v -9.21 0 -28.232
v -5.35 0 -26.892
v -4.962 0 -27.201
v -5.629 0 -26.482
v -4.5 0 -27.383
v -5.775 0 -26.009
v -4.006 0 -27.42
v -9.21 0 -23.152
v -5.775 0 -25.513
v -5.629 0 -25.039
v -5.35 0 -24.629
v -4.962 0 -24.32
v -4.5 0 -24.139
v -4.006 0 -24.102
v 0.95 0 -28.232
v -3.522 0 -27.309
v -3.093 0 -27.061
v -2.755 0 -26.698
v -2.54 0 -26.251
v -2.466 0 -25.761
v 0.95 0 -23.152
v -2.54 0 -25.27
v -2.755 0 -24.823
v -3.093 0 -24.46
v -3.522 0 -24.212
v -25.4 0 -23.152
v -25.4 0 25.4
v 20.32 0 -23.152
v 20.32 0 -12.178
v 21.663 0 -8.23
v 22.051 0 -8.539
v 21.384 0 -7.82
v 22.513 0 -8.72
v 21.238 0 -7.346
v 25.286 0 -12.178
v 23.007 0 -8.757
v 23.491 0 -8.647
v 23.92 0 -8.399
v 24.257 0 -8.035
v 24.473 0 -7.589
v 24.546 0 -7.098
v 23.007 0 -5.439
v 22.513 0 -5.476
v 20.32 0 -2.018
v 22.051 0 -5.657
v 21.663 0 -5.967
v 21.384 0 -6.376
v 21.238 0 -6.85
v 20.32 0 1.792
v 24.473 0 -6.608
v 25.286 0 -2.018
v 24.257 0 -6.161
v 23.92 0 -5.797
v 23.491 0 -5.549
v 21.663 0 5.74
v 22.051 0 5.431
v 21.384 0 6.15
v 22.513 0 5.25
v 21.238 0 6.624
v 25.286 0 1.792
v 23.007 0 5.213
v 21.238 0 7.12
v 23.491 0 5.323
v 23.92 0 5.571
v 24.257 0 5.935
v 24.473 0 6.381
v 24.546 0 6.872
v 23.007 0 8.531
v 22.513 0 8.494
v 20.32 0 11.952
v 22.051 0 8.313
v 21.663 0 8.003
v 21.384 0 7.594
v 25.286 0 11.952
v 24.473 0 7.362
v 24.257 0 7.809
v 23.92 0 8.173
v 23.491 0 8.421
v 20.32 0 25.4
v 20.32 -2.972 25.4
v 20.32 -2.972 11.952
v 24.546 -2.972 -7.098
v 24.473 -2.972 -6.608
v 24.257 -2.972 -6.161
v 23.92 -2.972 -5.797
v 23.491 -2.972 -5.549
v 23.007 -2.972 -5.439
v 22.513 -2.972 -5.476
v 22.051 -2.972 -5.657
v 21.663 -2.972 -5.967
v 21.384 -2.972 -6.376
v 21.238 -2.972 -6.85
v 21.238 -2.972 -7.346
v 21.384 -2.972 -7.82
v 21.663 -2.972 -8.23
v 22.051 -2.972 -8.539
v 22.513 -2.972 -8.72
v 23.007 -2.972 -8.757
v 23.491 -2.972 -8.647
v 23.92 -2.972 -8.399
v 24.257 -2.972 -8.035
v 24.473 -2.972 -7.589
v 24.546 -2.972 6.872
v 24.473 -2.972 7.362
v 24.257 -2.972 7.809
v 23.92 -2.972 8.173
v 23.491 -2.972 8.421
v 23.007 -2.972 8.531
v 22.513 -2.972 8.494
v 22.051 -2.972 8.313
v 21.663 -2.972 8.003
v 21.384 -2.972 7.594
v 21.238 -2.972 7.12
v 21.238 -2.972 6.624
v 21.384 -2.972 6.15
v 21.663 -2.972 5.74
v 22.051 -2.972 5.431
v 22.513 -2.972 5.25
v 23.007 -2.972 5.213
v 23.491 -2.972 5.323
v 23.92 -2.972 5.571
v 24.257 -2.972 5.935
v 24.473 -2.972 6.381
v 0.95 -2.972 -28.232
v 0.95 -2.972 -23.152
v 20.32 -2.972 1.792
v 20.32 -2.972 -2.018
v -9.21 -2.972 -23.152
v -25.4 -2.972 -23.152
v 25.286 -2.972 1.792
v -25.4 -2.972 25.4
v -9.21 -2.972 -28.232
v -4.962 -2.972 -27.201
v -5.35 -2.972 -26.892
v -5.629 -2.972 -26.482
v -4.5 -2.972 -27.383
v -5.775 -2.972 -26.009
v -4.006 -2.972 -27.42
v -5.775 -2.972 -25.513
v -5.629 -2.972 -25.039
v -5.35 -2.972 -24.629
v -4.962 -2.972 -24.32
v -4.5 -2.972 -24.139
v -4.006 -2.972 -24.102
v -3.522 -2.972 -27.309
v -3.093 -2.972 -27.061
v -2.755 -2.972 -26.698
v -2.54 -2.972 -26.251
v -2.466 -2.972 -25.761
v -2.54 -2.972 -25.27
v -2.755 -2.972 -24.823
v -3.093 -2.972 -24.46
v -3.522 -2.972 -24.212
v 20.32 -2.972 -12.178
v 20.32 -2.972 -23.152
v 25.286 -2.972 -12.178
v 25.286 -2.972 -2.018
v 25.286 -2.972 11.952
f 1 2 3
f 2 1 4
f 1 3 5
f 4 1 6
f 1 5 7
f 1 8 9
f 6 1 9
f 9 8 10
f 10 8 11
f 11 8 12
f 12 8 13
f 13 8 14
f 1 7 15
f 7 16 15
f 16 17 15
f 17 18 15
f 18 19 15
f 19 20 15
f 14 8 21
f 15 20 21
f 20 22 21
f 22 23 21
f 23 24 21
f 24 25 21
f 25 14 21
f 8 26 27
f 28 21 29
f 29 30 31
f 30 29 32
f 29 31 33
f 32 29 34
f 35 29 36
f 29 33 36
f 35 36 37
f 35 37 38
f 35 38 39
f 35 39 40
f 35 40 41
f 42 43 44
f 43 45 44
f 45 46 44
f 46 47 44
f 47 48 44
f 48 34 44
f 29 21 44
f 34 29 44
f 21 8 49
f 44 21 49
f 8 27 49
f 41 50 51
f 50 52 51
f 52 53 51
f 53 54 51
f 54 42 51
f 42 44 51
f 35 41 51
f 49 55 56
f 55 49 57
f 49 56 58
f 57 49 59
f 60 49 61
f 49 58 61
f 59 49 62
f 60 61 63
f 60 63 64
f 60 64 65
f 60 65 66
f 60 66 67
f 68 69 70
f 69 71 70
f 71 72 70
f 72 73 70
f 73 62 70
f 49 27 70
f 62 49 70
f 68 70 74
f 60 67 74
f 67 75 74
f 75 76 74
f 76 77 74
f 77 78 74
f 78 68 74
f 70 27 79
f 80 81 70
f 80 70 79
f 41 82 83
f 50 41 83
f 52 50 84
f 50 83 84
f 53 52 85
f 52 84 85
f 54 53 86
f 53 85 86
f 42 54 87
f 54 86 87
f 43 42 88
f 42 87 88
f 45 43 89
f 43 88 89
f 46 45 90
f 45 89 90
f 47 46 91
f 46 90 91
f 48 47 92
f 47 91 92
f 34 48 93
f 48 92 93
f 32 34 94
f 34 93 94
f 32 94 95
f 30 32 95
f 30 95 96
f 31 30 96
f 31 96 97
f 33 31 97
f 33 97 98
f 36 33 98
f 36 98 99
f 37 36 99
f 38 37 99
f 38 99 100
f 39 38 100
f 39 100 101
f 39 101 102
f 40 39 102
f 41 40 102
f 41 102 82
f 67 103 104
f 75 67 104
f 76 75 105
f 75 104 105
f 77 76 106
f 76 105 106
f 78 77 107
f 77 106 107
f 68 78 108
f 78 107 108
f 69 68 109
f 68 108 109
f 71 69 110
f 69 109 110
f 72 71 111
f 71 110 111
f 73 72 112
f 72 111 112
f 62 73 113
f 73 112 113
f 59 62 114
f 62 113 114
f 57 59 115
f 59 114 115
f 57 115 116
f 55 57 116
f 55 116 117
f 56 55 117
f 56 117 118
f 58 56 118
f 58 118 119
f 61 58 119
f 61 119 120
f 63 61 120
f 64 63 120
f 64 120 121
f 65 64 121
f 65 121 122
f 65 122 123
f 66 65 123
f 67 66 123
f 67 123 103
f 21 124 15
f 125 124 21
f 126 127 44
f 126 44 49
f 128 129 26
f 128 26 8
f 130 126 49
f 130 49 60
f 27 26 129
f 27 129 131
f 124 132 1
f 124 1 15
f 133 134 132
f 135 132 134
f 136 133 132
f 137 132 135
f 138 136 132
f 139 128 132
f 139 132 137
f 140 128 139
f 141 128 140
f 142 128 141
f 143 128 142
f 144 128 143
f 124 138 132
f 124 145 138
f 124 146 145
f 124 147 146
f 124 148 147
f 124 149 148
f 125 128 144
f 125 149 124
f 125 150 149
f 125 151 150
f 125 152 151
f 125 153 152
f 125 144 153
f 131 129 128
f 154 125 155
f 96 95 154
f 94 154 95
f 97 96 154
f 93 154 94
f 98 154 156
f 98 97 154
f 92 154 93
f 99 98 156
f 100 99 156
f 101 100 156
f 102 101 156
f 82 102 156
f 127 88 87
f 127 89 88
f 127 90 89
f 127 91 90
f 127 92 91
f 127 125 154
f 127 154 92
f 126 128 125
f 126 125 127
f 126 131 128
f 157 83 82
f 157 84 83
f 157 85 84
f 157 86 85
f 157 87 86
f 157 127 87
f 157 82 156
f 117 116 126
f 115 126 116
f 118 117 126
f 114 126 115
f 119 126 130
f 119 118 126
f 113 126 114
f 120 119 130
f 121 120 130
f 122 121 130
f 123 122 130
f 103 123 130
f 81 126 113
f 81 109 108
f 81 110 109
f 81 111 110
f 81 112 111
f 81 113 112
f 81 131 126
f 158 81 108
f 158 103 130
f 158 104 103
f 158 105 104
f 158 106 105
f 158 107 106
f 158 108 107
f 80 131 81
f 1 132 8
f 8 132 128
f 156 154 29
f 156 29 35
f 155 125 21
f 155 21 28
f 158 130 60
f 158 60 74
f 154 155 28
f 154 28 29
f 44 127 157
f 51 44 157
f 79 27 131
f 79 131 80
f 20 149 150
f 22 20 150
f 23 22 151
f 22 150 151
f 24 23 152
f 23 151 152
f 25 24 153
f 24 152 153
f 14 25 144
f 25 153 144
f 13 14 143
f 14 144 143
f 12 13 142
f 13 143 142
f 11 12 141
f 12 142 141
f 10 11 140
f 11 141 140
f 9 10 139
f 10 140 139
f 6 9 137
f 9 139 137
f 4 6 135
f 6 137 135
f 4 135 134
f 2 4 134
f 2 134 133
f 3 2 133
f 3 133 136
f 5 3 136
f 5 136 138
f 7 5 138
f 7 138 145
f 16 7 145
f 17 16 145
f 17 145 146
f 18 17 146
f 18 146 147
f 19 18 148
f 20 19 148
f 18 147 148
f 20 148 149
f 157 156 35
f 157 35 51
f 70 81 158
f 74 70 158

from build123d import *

# Parameters (mm, degrees)
F0_W      = 50.8
F0_H      = 50.8
F1_DEPTH  = 2.9718
F3_W      = 5.08
F3_H      = 50.8
F4_DEPTH  = 2.9728
F2_W      = 5.08
F2_H      = 10.16
F5_DEPTH  = 2.9718
F6_W      = 45.72
F6_H      = 2.2479
F7_DEPTH  = 2.9728
F8_R      = 1.6637
F9_DEPTH  = 2.9728
F10_W     = 10.16
F10_H     = 5.08
F10_R     = 1.6637
F11_DEPTH = 2.9718


with BuildPart() as f1:
    # F0 (on Front) → F1 (new body)
    with BuildSketch(Plane.XZ):
        Rectangle(F0_W, F0_H)
    extrude(amount=F1_DEPTH)

    # F3 (on face) → F4 (cut, through all)
    with BuildSketch(Plane.XZ.offset(2.9718)):
        with Locations((22.86, 0)):
            Rectangle(F3_W, F3_H)
    extrude(amount=-F4_DEPTH, mode=Mode.SUBTRACT)

    # F2 (on face) → F5 (join)
    with BuildSketch(Plane.XZ.offset(2.9718)):
        with Locations((22.745747, 6.871837)):
            Rectangle(F2_W, F2_H)
        with Locations((22.745747, -7.098163)):
            Rectangle(F2_W, F2_H)
    extrude(amount=-F5_DEPTH)

    # F6 (on face) → F7 (cut, through all)
    with BuildSketch(Plane.XZ.offset(2.9718)):
        with Locations((-2.54, -24.27605)):
            Rectangle(F6_W, F6_H)
    extrude(amount=-F7_DEPTH, mode=Mode.SUBTRACT)

    # F8 (on face) → F9 (cut, through all)
    with BuildSketch(Plane.XZ.offset(2.9718)):
        with Locations((22.88278, 6.871837)):
            Circle(F8_R)
        with Locations((22.88278, -7.098163)):
            Circle(F8_R)
    extrude(amount=-F9_DEPTH, mode=Mode.SUBTRACT)

    # F10 (on face) → F11 (join)
    with BuildSketch(Plane.XZ.offset(2.9718)):
        with Locations((-4.13004, -25.6921)):
            Rectangle(F10_W, F10_H)
        with Locations((-4.13004, -25.760639)):
            Circle(F10_R, mode=Mode.SUBTRACT)
    extrude(amount=-F11_DEPTH)


solid = f1.part
